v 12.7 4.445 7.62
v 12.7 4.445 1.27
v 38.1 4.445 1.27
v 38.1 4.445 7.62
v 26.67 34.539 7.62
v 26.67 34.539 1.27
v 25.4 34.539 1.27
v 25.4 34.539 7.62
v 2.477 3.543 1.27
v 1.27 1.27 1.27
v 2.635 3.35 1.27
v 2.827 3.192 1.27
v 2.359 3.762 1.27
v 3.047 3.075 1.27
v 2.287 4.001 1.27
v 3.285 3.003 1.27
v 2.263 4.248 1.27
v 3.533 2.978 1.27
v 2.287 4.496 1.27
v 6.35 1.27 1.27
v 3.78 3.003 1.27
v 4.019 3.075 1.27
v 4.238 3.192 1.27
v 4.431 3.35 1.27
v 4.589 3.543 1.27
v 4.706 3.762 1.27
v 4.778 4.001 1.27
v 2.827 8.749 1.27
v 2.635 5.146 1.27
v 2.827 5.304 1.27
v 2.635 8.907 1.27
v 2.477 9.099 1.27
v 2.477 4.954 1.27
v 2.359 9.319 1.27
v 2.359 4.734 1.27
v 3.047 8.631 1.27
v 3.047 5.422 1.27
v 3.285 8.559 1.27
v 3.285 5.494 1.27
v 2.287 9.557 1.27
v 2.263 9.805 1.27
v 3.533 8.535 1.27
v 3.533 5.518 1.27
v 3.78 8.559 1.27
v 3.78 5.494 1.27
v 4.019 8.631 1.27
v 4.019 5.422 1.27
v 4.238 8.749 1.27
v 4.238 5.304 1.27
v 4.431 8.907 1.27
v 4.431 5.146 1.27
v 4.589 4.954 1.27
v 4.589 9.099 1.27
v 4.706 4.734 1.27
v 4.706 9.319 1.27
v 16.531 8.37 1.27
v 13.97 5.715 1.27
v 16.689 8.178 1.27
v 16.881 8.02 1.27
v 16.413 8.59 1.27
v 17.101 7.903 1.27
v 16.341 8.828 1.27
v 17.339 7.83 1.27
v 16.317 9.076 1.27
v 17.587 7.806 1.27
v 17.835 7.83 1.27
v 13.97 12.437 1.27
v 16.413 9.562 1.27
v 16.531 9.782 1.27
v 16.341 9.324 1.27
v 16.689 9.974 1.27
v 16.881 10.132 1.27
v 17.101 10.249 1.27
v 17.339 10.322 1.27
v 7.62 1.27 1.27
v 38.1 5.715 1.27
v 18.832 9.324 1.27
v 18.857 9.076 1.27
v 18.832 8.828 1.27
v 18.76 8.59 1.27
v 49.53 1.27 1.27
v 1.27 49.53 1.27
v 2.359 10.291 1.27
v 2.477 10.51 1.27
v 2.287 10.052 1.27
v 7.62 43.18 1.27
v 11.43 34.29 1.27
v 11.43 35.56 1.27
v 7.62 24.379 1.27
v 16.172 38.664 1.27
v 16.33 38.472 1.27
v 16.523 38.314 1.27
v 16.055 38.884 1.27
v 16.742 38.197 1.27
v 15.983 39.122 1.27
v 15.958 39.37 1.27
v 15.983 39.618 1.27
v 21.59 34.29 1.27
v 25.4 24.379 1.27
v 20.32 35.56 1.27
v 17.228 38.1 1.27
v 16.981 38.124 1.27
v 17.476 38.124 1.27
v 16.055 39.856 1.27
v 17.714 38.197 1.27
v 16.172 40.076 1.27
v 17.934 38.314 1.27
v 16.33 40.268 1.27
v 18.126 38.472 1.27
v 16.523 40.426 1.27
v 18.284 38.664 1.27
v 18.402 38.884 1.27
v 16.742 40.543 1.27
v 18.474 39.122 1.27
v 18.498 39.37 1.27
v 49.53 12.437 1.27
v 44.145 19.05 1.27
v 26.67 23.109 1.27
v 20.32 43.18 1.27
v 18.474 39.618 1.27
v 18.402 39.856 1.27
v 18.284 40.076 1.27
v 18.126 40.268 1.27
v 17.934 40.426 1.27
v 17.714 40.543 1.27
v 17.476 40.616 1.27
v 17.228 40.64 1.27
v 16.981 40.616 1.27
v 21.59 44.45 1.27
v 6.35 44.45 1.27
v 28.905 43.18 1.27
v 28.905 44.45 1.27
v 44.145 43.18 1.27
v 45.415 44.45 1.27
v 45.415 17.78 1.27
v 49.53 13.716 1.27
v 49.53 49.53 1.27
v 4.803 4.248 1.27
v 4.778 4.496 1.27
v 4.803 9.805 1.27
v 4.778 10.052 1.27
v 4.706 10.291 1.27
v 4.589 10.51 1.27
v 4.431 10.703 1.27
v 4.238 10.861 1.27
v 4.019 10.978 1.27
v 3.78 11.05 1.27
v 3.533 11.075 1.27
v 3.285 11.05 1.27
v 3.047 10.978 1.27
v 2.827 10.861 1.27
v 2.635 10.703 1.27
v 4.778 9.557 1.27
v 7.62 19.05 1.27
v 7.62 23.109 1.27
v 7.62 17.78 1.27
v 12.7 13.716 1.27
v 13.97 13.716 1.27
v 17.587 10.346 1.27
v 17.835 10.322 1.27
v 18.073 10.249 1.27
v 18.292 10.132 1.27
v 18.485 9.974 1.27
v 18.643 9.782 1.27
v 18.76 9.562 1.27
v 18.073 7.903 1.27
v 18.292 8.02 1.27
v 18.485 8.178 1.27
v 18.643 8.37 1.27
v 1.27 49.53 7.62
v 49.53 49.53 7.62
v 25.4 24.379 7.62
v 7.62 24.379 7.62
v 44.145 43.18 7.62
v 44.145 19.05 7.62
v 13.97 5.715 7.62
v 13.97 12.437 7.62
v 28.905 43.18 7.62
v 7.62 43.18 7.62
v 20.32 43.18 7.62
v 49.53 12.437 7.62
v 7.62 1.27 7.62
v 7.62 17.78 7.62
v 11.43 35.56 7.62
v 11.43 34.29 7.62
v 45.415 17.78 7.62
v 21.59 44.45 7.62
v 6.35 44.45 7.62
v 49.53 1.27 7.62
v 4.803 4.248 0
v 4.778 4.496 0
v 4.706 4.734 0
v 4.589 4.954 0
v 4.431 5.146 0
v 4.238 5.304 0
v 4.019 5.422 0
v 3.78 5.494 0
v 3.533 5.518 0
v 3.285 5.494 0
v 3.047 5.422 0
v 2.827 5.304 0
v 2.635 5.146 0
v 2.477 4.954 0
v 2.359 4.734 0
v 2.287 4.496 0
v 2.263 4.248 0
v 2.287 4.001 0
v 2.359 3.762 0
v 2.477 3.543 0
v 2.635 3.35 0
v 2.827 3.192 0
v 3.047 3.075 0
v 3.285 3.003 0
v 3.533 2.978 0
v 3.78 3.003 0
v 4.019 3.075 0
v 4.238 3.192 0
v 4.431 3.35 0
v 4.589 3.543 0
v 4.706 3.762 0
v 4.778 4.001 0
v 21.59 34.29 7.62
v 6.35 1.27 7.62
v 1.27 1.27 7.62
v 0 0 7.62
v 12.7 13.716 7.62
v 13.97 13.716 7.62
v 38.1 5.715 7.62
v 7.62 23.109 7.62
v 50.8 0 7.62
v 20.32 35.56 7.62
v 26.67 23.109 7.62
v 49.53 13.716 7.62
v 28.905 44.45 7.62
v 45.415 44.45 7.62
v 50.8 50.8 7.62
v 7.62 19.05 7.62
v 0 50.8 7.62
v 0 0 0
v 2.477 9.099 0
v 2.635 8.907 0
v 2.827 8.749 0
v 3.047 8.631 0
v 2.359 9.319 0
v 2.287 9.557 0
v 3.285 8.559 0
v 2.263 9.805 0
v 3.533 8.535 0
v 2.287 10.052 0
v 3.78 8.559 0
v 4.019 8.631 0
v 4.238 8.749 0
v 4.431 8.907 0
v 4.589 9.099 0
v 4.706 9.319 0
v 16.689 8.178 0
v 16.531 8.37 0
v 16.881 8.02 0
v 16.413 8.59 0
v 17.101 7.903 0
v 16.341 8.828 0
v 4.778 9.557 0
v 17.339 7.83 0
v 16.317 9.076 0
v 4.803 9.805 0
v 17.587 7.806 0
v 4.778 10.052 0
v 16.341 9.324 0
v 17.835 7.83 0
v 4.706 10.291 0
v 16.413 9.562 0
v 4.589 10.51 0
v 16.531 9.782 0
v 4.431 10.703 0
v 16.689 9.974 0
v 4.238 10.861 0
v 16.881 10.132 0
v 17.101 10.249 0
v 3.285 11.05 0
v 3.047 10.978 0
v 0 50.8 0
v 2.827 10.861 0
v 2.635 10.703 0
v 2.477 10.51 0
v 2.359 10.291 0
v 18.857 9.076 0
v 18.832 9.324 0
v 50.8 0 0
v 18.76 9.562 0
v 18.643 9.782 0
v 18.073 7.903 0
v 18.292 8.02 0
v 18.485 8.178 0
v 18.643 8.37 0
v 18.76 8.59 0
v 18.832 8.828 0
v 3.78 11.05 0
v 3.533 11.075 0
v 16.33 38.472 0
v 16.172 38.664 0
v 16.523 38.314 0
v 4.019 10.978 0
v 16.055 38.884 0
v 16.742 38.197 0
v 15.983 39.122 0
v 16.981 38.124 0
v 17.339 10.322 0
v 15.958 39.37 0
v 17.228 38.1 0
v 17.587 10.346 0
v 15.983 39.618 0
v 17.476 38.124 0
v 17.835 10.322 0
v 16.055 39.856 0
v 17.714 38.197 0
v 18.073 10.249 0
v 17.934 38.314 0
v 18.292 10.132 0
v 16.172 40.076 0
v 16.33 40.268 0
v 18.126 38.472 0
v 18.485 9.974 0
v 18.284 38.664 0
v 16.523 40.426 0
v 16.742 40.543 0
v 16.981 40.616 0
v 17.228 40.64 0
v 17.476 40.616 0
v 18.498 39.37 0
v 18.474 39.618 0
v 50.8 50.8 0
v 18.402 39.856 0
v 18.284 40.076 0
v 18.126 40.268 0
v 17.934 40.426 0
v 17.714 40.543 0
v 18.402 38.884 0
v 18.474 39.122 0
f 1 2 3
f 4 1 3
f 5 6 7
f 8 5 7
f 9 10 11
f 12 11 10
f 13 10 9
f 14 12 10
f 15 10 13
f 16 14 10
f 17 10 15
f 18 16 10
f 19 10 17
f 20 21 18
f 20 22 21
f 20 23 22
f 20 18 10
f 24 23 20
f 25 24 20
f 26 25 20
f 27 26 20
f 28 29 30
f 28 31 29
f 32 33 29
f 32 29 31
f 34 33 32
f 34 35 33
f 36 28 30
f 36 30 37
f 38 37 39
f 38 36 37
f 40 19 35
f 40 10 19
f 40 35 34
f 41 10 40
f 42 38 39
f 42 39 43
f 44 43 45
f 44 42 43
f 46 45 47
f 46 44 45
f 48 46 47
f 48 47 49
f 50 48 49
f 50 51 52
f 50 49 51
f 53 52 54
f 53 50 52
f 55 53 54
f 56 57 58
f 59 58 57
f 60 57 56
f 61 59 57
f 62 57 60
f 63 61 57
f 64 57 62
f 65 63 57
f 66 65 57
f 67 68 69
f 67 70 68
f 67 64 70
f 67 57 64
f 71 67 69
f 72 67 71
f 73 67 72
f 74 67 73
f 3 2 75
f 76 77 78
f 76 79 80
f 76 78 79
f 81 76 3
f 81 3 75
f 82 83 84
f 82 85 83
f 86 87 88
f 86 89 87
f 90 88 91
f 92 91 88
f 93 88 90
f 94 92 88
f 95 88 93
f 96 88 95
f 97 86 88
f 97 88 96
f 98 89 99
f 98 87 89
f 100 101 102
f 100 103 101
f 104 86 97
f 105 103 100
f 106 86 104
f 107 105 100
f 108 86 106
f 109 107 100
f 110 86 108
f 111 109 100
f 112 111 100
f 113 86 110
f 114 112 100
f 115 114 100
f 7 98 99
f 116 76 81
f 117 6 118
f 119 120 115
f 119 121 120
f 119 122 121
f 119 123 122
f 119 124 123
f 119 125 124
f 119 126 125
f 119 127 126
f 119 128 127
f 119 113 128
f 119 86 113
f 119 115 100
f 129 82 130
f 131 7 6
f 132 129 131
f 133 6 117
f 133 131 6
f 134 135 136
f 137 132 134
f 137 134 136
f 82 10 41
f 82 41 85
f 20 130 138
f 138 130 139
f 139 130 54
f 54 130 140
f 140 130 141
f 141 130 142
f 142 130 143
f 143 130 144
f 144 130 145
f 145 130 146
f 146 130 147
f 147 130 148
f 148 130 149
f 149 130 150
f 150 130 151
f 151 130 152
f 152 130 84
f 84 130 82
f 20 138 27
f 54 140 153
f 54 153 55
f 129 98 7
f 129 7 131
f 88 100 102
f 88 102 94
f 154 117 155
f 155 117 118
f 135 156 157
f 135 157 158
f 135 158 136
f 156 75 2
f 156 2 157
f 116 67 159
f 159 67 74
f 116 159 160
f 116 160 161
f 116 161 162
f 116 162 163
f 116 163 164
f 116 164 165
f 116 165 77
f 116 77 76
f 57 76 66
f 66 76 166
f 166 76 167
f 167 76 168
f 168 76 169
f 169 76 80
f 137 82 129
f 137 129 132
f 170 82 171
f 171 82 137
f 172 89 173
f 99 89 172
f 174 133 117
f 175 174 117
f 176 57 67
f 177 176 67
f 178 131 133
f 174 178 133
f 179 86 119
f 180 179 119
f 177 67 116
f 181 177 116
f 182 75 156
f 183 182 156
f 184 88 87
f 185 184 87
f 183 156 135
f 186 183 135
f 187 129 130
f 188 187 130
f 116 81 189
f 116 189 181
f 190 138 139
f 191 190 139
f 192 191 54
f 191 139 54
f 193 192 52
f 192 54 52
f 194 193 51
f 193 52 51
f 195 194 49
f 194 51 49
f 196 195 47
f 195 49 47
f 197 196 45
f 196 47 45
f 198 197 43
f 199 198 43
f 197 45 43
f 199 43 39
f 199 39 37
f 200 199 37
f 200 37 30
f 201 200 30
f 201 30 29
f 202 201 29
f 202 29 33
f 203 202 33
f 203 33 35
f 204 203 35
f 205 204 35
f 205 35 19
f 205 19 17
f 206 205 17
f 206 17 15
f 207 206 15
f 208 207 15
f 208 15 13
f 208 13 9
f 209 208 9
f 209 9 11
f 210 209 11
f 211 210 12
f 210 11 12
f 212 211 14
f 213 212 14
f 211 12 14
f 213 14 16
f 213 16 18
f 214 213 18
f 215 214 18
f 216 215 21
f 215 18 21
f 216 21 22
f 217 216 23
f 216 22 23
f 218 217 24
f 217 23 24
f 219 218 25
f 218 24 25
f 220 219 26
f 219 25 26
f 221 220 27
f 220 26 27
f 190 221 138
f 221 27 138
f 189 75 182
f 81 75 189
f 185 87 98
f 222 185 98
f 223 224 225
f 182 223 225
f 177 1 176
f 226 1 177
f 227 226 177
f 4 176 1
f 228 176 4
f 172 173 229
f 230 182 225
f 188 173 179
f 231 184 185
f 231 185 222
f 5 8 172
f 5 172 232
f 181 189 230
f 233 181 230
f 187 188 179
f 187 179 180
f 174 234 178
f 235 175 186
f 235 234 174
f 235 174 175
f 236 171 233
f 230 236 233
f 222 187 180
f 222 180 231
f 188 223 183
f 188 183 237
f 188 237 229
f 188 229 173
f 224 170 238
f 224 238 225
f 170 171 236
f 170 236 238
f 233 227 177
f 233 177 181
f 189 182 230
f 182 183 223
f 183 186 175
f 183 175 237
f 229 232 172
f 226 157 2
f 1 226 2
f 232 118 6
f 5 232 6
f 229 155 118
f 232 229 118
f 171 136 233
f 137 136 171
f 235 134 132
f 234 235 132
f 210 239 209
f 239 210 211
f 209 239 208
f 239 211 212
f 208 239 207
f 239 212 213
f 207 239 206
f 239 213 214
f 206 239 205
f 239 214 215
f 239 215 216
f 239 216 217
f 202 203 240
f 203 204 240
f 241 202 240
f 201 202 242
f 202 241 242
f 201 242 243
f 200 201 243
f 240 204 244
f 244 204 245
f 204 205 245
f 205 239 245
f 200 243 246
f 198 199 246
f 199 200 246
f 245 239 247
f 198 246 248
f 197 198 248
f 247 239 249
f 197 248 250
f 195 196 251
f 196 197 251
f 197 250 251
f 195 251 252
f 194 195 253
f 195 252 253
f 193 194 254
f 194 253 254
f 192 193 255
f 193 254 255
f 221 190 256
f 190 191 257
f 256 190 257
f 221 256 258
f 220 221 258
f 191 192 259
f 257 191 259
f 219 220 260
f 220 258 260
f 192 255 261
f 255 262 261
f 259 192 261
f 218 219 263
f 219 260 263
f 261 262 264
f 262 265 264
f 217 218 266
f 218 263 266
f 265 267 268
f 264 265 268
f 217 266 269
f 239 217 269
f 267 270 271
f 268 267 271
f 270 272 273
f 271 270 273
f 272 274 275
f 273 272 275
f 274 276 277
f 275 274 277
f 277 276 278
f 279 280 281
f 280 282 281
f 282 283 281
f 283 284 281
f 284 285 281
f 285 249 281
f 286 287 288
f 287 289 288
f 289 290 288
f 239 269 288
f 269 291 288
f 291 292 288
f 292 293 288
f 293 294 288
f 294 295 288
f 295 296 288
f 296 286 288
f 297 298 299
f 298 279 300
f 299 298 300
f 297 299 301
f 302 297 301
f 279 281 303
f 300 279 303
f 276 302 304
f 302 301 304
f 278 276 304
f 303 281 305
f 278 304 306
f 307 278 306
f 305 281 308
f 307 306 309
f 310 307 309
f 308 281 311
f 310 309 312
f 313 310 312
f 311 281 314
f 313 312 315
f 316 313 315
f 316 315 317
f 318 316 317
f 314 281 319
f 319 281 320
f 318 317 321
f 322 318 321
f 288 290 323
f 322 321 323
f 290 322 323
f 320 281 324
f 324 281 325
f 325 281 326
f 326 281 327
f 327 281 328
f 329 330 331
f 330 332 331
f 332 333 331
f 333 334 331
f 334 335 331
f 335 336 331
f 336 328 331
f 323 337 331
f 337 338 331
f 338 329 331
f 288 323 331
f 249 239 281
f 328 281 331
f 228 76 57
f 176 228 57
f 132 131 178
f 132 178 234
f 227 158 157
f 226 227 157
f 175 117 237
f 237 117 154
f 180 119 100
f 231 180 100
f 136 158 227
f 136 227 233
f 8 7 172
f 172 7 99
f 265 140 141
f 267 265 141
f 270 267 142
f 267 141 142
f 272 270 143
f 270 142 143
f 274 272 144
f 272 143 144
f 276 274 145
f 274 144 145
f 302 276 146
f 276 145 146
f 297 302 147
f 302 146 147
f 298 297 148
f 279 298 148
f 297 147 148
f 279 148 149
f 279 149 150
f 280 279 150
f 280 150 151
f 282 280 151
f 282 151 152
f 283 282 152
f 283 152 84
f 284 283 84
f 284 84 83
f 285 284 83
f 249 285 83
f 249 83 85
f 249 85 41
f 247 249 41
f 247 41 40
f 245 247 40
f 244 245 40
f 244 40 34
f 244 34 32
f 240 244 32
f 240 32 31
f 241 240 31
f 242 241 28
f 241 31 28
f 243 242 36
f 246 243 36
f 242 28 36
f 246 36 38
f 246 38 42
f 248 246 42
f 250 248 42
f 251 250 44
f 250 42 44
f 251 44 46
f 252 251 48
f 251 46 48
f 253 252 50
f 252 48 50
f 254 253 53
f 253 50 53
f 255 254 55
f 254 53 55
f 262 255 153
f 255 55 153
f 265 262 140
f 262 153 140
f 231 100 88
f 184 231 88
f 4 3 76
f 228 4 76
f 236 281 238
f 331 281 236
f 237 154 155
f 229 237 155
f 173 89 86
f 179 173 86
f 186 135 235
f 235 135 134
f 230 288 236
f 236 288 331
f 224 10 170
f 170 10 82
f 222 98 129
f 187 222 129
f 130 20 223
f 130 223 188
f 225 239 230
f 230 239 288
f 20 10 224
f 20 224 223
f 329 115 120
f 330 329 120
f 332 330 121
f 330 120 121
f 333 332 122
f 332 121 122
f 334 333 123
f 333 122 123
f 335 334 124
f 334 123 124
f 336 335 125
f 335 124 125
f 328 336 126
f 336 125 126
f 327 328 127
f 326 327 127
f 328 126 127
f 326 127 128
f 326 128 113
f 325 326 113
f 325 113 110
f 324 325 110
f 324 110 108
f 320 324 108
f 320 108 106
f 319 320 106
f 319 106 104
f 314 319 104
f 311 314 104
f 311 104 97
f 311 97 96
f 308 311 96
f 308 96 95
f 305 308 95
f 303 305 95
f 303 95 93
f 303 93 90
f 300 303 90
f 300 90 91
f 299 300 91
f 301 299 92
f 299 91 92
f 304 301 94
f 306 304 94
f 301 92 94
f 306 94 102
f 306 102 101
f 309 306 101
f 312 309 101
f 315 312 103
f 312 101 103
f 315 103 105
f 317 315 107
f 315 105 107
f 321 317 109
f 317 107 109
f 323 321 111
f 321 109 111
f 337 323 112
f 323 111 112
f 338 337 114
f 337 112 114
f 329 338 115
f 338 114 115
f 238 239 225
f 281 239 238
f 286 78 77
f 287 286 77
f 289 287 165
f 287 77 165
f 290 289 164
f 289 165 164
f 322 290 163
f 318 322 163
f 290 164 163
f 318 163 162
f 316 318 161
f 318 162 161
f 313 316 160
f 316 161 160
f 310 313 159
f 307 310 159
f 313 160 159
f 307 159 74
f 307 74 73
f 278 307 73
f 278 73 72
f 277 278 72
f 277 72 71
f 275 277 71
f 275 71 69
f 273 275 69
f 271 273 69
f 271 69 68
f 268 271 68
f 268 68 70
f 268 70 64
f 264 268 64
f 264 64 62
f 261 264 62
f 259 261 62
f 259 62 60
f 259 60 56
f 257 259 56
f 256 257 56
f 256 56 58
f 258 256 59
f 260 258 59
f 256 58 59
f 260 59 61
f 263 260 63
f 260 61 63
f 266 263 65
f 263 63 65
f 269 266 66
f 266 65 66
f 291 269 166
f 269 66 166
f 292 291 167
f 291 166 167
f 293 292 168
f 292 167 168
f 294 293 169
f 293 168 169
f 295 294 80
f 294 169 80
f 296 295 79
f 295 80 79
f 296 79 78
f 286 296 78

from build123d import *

# Parameters (mm, degrees)
F0_W       = 50.8
F0_H       = 50.8
F1_DEPTH   = 7.62
F2_T       = -1.27
F3_W       = 1.27
F3_H       = 43.18
F4_DEPTH   = 6.35
F5_R       = 1.27
F6_DEPTH   = 25.4
F7_W       = 12.7
F7_H       = 1.27
F8_DEPTH   = 6.35
F9_R       = 1.27
F10_DEPTH  = 25.4
F11_W      = 15.24
F11_H      = 1.27
F11_W_2    = 17.78
F12_DEPTH  = 6.35
F13_W      = 35.56
F13_H      = 1.279007
F13_R      = 1.27
F14_DEPTH  = 6.35
F14_FACE_R = 1.27
F15_DEPTH  = 25.4


with BuildPart() as f1:
    # F0 (on Top) → F1 (new body)
    with BuildSketch(Plane.XY):
        with Locations((25.4, 25.4)):
            Rectangle(F0_W, F0_H)
    extrude(amount=F1_DEPTH)

    # F2
    f2_openings = [f1.faces().sort_by_distance(p)[0] for p in [
        (25.4, 25.4, 7.62),
    ]]
    offset(amount=F2_T, openings=f2_openings)

    # F3 (on face) → F4 (join)
    with BuildSketch(Plane.XY.offset(1.27)):
        with Locations((6.985, 22.86)):
            Rectangle(F3_W, F3_H)
    extrude(amount=F4_DEPTH)

    # F5 (on face) → F6 (cut)
    with BuildSketch(Plane.XY.offset(1.27)):
        with Locations((3.532713, 9.804559)):
            Circle(F5_R)
        with Locations((3.532713, 4.248444)):
            Circle(F5_R)
    extrude(amount=-F6_DEPTH, mode=Mode.SUBTRACT)

    # F7 (on face) → F8 (join)
    with BuildSketch(Plane.XY.offset(1.27)):
        with Locations((13.97, 43.815)):
            Rectangle(F7_W, F7_H)
        Polygon((21.59, 44.45), (20.32, 44.45), (20.32, 43.18), (20.32, 35.56), (21.59, 35.56), align=None)
        Polygon((21.59, 35.56), (20.32, 35.56), (11.43, 35.56), (11.43, 34.29), (21.59, 34.29), align=None)
    extrude(amount=F8_DEPTH)

    # F9 (on face) → F10 (cut)
    with BuildSketch(Plane.XY.offset(1.27)):
        with Locations((17.22843, 39.37)):
            Circle(F9_R)
    extrude(amount=-F10_DEPTH, mode=Mode.SUBTRACT)

    # F11 (on face) → F12 (join)
    with BuildSketch(Plane.XY.offset(1.27)):
        with Locations((36.5252, 43.815)):
            Rectangle(F11_W, F11_H)
        Polygon((44.1452, 44.45), (44.1452, 43.18), (44.1452, 19.05), (45.4152, 19.05), (45.4152, 44.45), align=None)
        Polygon((45.4152, 19.05), (44.1452, 19.05), (7.62, 19.05), (7.62, 17.78), (45.4152, 17.78), align=None)
        with Locations((16.51, 23.743602)):
            Rectangle(F11_W_2, F11_H)
        Polygon((25.4, 34.538602), (25.4, 24.378602), (25.4, 23.108602), (26.67, 23.108602), (26.67, 34.538602), align=None)
    extrude(amount=F12_DEPTH)

    # F13 (on face) → F14 (join)
    with BuildSketch(Plane.XY.offset(1.27)):
        Polygon((13.97, 12.436993), (13.97, 13.716), (12.7, 13.716), (12.7, 5.715), (13.97, 5.715), align=None)
        with Locations((31.75, 13.076496)):
            Rectangle(F13_W, F13_H)
        Polygon((13.97, 5.715), (12.7, 5.715), (12.7, 4.445), (38.1, 4.445), (38.1, 5.715), align=None)
        with Locations((17.586783, 9.075997)):
            Circle(F13_R)
    extrude(amount=F14_DEPTH)

    # F14_face (on face) → F15 (cut)
    with BuildSketch(Plane(origin=(17.586783, 9.075997, 7.62), x_dir=(1, 0, 0), z_dir=(0, 0, 1))):
        Circle(F14_FACE_R)
    extrude(amount=-F15_DEPTH, mode=Mode.SUBTRACT)


solid = f1.part
